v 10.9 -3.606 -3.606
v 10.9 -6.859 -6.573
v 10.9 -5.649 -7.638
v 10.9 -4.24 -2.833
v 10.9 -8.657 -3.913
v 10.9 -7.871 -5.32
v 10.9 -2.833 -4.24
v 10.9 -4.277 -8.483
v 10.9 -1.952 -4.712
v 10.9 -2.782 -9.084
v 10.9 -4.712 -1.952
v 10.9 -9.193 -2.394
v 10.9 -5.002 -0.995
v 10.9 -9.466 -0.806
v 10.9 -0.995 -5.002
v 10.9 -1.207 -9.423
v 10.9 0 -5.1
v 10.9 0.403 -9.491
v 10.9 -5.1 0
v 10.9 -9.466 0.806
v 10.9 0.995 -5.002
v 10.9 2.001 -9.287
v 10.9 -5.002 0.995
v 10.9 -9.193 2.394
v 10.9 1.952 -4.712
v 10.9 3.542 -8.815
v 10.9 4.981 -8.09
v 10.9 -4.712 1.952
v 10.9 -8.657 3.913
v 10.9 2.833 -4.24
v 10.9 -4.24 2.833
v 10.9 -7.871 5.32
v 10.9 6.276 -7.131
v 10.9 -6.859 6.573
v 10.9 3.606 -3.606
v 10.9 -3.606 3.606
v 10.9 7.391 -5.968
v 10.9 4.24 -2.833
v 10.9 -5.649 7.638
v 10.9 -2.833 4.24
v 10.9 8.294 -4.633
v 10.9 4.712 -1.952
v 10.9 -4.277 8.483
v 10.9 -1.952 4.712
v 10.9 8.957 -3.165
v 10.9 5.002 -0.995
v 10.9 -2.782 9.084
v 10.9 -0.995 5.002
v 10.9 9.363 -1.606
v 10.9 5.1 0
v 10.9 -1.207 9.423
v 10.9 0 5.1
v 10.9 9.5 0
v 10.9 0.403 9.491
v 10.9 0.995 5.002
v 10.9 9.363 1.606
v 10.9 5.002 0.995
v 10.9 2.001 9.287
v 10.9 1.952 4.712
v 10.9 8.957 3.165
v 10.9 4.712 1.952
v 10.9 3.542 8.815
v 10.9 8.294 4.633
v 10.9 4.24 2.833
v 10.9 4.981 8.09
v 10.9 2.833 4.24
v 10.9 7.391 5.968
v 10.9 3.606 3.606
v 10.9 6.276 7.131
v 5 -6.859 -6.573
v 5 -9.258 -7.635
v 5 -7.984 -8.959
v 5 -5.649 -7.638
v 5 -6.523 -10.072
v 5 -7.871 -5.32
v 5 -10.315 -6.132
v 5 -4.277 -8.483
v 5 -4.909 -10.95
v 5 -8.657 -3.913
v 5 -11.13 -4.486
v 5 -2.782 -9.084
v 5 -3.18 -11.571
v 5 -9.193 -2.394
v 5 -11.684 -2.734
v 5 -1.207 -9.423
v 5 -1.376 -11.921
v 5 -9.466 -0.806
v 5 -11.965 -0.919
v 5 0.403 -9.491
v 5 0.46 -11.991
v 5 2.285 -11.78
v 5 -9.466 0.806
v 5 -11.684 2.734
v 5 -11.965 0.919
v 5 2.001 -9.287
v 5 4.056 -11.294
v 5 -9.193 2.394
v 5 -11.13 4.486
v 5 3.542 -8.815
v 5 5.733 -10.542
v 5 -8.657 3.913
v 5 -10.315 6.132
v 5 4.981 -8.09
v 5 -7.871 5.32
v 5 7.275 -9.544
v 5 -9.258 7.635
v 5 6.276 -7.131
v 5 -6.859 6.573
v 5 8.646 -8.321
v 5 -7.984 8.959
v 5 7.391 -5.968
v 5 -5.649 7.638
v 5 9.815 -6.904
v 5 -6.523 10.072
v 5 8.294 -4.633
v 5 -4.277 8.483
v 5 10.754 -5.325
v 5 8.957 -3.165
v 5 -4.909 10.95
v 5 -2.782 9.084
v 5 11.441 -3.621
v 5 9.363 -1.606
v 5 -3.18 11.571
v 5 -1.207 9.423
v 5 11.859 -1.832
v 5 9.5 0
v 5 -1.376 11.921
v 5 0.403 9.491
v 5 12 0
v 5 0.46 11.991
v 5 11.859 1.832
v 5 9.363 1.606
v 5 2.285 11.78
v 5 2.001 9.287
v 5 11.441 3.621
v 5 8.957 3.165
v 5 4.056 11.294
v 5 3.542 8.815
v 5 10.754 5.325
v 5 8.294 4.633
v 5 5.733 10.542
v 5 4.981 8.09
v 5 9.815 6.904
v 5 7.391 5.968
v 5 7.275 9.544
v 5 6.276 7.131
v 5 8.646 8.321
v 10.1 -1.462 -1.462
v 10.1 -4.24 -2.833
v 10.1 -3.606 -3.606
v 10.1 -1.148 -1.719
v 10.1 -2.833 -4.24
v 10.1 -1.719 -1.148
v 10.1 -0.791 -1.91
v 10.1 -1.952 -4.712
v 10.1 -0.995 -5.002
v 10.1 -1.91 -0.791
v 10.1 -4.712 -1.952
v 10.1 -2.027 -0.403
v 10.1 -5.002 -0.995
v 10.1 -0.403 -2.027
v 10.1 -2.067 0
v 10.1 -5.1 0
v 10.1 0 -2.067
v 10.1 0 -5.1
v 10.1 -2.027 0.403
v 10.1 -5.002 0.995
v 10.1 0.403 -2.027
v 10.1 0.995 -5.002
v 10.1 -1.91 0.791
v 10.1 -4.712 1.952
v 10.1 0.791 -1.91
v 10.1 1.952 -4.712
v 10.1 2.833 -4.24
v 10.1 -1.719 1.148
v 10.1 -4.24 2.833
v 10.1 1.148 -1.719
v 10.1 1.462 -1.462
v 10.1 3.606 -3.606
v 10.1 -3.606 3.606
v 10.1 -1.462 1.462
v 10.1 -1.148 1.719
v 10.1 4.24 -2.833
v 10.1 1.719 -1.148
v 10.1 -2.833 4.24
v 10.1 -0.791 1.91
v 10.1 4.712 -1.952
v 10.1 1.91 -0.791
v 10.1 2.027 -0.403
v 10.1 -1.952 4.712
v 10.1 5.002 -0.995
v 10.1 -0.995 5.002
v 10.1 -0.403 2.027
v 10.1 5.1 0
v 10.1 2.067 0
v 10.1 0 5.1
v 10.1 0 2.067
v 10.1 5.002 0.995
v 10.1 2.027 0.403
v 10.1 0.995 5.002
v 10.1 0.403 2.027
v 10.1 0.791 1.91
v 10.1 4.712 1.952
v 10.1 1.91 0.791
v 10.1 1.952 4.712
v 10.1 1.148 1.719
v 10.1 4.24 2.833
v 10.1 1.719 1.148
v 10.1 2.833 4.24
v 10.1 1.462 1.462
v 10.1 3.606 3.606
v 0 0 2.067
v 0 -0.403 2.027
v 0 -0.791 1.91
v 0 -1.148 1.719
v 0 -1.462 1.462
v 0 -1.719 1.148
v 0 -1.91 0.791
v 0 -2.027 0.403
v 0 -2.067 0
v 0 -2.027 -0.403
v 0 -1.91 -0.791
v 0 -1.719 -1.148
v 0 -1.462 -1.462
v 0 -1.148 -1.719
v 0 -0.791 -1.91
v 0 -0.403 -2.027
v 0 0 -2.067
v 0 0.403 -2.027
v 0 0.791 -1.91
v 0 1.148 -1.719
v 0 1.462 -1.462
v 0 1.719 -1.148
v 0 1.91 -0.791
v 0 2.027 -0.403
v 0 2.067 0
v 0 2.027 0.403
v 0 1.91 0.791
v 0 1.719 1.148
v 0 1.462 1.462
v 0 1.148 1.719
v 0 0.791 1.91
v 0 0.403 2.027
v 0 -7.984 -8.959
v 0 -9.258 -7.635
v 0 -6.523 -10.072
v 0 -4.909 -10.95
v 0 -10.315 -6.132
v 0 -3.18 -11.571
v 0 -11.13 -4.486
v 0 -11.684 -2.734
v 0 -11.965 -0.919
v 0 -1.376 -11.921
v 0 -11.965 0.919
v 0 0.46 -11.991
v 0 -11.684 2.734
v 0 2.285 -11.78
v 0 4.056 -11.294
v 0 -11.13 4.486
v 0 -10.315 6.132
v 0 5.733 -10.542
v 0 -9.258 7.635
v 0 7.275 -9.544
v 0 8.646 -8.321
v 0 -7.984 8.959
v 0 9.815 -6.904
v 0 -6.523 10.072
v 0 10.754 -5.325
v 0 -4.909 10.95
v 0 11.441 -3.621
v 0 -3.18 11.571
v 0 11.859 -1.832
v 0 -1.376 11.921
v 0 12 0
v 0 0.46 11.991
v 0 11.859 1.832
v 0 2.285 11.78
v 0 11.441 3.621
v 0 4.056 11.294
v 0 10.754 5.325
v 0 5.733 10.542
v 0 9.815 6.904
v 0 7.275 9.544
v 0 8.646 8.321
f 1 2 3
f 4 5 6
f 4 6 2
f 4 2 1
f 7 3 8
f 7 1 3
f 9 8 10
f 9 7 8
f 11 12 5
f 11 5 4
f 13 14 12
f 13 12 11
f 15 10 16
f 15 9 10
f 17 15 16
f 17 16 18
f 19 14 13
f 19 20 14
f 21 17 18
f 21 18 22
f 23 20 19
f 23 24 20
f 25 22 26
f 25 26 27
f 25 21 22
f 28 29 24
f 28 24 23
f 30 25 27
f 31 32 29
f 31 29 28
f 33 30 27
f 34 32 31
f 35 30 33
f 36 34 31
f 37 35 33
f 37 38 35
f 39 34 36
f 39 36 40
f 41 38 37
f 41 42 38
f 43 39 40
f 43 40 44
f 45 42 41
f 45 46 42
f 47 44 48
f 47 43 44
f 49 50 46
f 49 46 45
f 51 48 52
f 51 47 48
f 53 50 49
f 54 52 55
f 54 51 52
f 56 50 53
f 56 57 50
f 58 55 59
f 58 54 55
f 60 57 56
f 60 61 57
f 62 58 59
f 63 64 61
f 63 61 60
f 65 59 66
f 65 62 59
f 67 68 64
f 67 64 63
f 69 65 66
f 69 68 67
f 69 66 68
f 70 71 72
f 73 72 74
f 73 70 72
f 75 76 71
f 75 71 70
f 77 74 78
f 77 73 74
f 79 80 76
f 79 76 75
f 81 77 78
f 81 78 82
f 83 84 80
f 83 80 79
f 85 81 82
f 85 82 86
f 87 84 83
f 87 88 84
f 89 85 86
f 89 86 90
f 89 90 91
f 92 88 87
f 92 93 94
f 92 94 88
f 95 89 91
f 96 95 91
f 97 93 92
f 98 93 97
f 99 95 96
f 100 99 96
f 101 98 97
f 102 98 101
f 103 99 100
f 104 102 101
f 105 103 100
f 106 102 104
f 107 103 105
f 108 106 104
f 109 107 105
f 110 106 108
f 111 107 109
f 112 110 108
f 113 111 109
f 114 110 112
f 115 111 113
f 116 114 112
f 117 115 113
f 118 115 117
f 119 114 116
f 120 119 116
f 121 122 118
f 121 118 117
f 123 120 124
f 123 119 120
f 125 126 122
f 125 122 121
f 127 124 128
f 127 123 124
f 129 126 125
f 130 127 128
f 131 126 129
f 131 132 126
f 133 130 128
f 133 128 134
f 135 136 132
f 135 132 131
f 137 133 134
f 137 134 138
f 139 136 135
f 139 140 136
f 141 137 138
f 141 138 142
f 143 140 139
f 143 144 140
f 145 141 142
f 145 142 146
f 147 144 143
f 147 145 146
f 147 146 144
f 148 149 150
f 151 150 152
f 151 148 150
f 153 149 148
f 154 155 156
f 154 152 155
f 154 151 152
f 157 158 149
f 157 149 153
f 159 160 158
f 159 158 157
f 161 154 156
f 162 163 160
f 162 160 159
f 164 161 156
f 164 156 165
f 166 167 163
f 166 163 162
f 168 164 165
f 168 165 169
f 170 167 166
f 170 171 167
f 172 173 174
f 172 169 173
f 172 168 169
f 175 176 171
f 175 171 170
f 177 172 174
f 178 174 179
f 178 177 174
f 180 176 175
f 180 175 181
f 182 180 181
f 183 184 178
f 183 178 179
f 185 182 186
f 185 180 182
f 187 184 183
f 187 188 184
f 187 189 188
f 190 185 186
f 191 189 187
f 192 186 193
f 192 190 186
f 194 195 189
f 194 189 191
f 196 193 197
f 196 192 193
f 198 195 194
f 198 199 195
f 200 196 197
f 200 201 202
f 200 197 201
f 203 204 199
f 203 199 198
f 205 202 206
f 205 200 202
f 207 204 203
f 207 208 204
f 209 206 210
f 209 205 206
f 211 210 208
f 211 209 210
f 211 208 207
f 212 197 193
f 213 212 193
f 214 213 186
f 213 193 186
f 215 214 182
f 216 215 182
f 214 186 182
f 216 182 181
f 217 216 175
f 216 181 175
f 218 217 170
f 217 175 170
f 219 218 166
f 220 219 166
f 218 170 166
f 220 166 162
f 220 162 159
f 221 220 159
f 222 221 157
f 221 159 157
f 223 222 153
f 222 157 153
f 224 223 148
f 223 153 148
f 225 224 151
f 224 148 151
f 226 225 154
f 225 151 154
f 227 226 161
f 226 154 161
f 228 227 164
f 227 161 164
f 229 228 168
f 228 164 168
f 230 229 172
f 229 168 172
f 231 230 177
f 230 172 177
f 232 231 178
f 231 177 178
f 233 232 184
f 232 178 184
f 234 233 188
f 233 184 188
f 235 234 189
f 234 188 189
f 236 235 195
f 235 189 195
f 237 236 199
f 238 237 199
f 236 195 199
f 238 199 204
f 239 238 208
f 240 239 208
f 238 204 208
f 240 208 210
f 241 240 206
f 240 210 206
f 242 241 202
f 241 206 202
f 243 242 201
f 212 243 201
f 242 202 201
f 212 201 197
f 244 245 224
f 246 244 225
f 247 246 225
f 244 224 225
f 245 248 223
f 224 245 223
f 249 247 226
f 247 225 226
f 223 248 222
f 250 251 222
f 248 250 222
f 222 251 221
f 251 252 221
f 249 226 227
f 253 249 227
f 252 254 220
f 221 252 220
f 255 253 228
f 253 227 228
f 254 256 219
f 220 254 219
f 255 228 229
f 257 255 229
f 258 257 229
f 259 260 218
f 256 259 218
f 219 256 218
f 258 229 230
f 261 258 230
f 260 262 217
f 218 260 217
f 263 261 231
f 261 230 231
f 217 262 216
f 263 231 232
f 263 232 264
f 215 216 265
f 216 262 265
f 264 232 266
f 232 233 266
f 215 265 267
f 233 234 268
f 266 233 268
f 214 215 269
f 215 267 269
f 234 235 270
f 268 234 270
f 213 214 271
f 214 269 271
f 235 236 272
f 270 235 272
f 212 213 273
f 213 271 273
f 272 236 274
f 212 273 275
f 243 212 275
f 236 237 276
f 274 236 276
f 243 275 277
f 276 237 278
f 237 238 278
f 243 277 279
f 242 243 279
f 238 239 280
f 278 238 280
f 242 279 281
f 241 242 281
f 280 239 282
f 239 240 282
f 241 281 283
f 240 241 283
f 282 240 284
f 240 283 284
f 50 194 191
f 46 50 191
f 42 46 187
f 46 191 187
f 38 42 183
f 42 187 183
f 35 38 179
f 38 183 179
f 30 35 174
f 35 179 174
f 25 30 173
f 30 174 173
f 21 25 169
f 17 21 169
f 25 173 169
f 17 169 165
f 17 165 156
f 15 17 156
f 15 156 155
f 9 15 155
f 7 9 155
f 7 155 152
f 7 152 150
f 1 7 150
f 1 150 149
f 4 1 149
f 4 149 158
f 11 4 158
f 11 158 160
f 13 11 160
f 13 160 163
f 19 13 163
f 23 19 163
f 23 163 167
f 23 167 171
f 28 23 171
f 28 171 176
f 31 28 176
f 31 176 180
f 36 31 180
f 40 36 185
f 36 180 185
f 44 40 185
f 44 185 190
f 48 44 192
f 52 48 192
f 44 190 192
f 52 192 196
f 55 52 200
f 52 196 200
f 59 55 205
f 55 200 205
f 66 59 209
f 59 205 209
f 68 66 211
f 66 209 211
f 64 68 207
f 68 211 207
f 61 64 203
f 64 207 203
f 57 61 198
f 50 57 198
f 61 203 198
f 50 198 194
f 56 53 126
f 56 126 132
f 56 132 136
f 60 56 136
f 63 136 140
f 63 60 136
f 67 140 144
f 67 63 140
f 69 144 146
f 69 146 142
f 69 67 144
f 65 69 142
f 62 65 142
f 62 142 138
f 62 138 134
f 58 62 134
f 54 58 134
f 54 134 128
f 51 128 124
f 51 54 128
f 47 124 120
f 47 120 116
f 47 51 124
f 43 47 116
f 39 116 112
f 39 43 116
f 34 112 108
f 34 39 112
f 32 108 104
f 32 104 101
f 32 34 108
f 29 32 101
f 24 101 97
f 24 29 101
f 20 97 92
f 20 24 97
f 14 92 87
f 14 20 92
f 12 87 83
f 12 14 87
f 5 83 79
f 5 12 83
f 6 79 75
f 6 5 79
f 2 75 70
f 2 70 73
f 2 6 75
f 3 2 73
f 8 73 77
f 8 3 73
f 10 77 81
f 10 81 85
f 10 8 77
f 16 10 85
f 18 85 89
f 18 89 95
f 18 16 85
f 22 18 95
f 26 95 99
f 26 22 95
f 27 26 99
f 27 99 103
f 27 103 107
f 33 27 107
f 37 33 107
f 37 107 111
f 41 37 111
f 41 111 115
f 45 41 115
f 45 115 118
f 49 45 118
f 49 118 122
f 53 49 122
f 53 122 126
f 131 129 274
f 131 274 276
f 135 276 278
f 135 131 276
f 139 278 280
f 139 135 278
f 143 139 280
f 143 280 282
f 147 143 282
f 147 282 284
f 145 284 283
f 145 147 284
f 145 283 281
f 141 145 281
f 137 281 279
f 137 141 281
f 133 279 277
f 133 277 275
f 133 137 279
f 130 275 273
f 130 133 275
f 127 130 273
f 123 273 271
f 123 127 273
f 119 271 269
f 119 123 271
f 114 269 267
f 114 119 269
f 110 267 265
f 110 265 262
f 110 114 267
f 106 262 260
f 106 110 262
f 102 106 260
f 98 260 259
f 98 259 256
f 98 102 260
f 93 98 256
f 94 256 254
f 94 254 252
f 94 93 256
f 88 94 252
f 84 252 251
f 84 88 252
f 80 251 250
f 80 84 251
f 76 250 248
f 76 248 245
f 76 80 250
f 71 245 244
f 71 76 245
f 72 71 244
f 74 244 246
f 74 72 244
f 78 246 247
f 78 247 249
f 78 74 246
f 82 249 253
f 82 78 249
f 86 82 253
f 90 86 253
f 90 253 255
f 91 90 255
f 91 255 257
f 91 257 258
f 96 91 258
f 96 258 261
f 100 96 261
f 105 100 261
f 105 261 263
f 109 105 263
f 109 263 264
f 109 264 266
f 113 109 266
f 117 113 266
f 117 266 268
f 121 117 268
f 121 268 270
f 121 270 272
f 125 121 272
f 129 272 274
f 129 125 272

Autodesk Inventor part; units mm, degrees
ref_plane "YZ Plane" through (0, 0, 0) normal (1, 0, 0) x (0, 1, 0)
ref_plane "XZ Plane" through (0, 0, 0) normal (0, 1, 0) x (-1, 0, 0)
ref_plane "XY Plane" through (0, 0, 0) normal (0, 0, 1) x (1, 0, 0)
sketch "Skizze1" plane through (0, 0, 0) normal (0, 0, 1) x (1, 0, 0)
  line L0 (0, 0) -> (0, 12)
  line L1 (0, 12) -> (5, 12)
  line L2 (5, 12) -> (5, 9.5)
  line L3 (5, 9.5) -> (10.9, 9.5)
  line L4 (10.9, 9.5) -> (10.9, 5)
  line L5 (0, 0) -> (10.1, 0)
  line L6 (10.9, 5) -> (10.1, 5)
  line L7 (10.1, 5) -> (10.1, 0)
  dimension "d0" = 19
  dimension "d1" = 24
  dimension "d2" = 5.9
  dimension "d3" = 5
  dimension "d12" = 10
  dimension "d13" = 5.1
revolve "Umdrehung1" add sketch "Skizze1" angle 360 about axis through (0, 0, 0) along (1, 0, 0)
sketch "Skizze2" plane through (0, 0, 0) normal (-1, 0, 0) x (0, 0, 1)
  point P0 (0, 0)
  point P1 (0, 0)
hole "Bohrung1" at (0, 0, 0) direction (1, 0, 0) diameter 4.134 depth 14.2 tip angle 118 thread size "M5x0.8" class "6H" standard "ISO Metric profile"
feature "Verdickung1" [suppressed]
thicken "Verdickung2" operation add thickness 0.1 both sides no extend neighbours yes toward (0, 0.9967573, -0.0804666) faces at (10.3667, 4.9838, -0.4023)
properties part number "SpringCompensation_Innside_DrivenPart"
